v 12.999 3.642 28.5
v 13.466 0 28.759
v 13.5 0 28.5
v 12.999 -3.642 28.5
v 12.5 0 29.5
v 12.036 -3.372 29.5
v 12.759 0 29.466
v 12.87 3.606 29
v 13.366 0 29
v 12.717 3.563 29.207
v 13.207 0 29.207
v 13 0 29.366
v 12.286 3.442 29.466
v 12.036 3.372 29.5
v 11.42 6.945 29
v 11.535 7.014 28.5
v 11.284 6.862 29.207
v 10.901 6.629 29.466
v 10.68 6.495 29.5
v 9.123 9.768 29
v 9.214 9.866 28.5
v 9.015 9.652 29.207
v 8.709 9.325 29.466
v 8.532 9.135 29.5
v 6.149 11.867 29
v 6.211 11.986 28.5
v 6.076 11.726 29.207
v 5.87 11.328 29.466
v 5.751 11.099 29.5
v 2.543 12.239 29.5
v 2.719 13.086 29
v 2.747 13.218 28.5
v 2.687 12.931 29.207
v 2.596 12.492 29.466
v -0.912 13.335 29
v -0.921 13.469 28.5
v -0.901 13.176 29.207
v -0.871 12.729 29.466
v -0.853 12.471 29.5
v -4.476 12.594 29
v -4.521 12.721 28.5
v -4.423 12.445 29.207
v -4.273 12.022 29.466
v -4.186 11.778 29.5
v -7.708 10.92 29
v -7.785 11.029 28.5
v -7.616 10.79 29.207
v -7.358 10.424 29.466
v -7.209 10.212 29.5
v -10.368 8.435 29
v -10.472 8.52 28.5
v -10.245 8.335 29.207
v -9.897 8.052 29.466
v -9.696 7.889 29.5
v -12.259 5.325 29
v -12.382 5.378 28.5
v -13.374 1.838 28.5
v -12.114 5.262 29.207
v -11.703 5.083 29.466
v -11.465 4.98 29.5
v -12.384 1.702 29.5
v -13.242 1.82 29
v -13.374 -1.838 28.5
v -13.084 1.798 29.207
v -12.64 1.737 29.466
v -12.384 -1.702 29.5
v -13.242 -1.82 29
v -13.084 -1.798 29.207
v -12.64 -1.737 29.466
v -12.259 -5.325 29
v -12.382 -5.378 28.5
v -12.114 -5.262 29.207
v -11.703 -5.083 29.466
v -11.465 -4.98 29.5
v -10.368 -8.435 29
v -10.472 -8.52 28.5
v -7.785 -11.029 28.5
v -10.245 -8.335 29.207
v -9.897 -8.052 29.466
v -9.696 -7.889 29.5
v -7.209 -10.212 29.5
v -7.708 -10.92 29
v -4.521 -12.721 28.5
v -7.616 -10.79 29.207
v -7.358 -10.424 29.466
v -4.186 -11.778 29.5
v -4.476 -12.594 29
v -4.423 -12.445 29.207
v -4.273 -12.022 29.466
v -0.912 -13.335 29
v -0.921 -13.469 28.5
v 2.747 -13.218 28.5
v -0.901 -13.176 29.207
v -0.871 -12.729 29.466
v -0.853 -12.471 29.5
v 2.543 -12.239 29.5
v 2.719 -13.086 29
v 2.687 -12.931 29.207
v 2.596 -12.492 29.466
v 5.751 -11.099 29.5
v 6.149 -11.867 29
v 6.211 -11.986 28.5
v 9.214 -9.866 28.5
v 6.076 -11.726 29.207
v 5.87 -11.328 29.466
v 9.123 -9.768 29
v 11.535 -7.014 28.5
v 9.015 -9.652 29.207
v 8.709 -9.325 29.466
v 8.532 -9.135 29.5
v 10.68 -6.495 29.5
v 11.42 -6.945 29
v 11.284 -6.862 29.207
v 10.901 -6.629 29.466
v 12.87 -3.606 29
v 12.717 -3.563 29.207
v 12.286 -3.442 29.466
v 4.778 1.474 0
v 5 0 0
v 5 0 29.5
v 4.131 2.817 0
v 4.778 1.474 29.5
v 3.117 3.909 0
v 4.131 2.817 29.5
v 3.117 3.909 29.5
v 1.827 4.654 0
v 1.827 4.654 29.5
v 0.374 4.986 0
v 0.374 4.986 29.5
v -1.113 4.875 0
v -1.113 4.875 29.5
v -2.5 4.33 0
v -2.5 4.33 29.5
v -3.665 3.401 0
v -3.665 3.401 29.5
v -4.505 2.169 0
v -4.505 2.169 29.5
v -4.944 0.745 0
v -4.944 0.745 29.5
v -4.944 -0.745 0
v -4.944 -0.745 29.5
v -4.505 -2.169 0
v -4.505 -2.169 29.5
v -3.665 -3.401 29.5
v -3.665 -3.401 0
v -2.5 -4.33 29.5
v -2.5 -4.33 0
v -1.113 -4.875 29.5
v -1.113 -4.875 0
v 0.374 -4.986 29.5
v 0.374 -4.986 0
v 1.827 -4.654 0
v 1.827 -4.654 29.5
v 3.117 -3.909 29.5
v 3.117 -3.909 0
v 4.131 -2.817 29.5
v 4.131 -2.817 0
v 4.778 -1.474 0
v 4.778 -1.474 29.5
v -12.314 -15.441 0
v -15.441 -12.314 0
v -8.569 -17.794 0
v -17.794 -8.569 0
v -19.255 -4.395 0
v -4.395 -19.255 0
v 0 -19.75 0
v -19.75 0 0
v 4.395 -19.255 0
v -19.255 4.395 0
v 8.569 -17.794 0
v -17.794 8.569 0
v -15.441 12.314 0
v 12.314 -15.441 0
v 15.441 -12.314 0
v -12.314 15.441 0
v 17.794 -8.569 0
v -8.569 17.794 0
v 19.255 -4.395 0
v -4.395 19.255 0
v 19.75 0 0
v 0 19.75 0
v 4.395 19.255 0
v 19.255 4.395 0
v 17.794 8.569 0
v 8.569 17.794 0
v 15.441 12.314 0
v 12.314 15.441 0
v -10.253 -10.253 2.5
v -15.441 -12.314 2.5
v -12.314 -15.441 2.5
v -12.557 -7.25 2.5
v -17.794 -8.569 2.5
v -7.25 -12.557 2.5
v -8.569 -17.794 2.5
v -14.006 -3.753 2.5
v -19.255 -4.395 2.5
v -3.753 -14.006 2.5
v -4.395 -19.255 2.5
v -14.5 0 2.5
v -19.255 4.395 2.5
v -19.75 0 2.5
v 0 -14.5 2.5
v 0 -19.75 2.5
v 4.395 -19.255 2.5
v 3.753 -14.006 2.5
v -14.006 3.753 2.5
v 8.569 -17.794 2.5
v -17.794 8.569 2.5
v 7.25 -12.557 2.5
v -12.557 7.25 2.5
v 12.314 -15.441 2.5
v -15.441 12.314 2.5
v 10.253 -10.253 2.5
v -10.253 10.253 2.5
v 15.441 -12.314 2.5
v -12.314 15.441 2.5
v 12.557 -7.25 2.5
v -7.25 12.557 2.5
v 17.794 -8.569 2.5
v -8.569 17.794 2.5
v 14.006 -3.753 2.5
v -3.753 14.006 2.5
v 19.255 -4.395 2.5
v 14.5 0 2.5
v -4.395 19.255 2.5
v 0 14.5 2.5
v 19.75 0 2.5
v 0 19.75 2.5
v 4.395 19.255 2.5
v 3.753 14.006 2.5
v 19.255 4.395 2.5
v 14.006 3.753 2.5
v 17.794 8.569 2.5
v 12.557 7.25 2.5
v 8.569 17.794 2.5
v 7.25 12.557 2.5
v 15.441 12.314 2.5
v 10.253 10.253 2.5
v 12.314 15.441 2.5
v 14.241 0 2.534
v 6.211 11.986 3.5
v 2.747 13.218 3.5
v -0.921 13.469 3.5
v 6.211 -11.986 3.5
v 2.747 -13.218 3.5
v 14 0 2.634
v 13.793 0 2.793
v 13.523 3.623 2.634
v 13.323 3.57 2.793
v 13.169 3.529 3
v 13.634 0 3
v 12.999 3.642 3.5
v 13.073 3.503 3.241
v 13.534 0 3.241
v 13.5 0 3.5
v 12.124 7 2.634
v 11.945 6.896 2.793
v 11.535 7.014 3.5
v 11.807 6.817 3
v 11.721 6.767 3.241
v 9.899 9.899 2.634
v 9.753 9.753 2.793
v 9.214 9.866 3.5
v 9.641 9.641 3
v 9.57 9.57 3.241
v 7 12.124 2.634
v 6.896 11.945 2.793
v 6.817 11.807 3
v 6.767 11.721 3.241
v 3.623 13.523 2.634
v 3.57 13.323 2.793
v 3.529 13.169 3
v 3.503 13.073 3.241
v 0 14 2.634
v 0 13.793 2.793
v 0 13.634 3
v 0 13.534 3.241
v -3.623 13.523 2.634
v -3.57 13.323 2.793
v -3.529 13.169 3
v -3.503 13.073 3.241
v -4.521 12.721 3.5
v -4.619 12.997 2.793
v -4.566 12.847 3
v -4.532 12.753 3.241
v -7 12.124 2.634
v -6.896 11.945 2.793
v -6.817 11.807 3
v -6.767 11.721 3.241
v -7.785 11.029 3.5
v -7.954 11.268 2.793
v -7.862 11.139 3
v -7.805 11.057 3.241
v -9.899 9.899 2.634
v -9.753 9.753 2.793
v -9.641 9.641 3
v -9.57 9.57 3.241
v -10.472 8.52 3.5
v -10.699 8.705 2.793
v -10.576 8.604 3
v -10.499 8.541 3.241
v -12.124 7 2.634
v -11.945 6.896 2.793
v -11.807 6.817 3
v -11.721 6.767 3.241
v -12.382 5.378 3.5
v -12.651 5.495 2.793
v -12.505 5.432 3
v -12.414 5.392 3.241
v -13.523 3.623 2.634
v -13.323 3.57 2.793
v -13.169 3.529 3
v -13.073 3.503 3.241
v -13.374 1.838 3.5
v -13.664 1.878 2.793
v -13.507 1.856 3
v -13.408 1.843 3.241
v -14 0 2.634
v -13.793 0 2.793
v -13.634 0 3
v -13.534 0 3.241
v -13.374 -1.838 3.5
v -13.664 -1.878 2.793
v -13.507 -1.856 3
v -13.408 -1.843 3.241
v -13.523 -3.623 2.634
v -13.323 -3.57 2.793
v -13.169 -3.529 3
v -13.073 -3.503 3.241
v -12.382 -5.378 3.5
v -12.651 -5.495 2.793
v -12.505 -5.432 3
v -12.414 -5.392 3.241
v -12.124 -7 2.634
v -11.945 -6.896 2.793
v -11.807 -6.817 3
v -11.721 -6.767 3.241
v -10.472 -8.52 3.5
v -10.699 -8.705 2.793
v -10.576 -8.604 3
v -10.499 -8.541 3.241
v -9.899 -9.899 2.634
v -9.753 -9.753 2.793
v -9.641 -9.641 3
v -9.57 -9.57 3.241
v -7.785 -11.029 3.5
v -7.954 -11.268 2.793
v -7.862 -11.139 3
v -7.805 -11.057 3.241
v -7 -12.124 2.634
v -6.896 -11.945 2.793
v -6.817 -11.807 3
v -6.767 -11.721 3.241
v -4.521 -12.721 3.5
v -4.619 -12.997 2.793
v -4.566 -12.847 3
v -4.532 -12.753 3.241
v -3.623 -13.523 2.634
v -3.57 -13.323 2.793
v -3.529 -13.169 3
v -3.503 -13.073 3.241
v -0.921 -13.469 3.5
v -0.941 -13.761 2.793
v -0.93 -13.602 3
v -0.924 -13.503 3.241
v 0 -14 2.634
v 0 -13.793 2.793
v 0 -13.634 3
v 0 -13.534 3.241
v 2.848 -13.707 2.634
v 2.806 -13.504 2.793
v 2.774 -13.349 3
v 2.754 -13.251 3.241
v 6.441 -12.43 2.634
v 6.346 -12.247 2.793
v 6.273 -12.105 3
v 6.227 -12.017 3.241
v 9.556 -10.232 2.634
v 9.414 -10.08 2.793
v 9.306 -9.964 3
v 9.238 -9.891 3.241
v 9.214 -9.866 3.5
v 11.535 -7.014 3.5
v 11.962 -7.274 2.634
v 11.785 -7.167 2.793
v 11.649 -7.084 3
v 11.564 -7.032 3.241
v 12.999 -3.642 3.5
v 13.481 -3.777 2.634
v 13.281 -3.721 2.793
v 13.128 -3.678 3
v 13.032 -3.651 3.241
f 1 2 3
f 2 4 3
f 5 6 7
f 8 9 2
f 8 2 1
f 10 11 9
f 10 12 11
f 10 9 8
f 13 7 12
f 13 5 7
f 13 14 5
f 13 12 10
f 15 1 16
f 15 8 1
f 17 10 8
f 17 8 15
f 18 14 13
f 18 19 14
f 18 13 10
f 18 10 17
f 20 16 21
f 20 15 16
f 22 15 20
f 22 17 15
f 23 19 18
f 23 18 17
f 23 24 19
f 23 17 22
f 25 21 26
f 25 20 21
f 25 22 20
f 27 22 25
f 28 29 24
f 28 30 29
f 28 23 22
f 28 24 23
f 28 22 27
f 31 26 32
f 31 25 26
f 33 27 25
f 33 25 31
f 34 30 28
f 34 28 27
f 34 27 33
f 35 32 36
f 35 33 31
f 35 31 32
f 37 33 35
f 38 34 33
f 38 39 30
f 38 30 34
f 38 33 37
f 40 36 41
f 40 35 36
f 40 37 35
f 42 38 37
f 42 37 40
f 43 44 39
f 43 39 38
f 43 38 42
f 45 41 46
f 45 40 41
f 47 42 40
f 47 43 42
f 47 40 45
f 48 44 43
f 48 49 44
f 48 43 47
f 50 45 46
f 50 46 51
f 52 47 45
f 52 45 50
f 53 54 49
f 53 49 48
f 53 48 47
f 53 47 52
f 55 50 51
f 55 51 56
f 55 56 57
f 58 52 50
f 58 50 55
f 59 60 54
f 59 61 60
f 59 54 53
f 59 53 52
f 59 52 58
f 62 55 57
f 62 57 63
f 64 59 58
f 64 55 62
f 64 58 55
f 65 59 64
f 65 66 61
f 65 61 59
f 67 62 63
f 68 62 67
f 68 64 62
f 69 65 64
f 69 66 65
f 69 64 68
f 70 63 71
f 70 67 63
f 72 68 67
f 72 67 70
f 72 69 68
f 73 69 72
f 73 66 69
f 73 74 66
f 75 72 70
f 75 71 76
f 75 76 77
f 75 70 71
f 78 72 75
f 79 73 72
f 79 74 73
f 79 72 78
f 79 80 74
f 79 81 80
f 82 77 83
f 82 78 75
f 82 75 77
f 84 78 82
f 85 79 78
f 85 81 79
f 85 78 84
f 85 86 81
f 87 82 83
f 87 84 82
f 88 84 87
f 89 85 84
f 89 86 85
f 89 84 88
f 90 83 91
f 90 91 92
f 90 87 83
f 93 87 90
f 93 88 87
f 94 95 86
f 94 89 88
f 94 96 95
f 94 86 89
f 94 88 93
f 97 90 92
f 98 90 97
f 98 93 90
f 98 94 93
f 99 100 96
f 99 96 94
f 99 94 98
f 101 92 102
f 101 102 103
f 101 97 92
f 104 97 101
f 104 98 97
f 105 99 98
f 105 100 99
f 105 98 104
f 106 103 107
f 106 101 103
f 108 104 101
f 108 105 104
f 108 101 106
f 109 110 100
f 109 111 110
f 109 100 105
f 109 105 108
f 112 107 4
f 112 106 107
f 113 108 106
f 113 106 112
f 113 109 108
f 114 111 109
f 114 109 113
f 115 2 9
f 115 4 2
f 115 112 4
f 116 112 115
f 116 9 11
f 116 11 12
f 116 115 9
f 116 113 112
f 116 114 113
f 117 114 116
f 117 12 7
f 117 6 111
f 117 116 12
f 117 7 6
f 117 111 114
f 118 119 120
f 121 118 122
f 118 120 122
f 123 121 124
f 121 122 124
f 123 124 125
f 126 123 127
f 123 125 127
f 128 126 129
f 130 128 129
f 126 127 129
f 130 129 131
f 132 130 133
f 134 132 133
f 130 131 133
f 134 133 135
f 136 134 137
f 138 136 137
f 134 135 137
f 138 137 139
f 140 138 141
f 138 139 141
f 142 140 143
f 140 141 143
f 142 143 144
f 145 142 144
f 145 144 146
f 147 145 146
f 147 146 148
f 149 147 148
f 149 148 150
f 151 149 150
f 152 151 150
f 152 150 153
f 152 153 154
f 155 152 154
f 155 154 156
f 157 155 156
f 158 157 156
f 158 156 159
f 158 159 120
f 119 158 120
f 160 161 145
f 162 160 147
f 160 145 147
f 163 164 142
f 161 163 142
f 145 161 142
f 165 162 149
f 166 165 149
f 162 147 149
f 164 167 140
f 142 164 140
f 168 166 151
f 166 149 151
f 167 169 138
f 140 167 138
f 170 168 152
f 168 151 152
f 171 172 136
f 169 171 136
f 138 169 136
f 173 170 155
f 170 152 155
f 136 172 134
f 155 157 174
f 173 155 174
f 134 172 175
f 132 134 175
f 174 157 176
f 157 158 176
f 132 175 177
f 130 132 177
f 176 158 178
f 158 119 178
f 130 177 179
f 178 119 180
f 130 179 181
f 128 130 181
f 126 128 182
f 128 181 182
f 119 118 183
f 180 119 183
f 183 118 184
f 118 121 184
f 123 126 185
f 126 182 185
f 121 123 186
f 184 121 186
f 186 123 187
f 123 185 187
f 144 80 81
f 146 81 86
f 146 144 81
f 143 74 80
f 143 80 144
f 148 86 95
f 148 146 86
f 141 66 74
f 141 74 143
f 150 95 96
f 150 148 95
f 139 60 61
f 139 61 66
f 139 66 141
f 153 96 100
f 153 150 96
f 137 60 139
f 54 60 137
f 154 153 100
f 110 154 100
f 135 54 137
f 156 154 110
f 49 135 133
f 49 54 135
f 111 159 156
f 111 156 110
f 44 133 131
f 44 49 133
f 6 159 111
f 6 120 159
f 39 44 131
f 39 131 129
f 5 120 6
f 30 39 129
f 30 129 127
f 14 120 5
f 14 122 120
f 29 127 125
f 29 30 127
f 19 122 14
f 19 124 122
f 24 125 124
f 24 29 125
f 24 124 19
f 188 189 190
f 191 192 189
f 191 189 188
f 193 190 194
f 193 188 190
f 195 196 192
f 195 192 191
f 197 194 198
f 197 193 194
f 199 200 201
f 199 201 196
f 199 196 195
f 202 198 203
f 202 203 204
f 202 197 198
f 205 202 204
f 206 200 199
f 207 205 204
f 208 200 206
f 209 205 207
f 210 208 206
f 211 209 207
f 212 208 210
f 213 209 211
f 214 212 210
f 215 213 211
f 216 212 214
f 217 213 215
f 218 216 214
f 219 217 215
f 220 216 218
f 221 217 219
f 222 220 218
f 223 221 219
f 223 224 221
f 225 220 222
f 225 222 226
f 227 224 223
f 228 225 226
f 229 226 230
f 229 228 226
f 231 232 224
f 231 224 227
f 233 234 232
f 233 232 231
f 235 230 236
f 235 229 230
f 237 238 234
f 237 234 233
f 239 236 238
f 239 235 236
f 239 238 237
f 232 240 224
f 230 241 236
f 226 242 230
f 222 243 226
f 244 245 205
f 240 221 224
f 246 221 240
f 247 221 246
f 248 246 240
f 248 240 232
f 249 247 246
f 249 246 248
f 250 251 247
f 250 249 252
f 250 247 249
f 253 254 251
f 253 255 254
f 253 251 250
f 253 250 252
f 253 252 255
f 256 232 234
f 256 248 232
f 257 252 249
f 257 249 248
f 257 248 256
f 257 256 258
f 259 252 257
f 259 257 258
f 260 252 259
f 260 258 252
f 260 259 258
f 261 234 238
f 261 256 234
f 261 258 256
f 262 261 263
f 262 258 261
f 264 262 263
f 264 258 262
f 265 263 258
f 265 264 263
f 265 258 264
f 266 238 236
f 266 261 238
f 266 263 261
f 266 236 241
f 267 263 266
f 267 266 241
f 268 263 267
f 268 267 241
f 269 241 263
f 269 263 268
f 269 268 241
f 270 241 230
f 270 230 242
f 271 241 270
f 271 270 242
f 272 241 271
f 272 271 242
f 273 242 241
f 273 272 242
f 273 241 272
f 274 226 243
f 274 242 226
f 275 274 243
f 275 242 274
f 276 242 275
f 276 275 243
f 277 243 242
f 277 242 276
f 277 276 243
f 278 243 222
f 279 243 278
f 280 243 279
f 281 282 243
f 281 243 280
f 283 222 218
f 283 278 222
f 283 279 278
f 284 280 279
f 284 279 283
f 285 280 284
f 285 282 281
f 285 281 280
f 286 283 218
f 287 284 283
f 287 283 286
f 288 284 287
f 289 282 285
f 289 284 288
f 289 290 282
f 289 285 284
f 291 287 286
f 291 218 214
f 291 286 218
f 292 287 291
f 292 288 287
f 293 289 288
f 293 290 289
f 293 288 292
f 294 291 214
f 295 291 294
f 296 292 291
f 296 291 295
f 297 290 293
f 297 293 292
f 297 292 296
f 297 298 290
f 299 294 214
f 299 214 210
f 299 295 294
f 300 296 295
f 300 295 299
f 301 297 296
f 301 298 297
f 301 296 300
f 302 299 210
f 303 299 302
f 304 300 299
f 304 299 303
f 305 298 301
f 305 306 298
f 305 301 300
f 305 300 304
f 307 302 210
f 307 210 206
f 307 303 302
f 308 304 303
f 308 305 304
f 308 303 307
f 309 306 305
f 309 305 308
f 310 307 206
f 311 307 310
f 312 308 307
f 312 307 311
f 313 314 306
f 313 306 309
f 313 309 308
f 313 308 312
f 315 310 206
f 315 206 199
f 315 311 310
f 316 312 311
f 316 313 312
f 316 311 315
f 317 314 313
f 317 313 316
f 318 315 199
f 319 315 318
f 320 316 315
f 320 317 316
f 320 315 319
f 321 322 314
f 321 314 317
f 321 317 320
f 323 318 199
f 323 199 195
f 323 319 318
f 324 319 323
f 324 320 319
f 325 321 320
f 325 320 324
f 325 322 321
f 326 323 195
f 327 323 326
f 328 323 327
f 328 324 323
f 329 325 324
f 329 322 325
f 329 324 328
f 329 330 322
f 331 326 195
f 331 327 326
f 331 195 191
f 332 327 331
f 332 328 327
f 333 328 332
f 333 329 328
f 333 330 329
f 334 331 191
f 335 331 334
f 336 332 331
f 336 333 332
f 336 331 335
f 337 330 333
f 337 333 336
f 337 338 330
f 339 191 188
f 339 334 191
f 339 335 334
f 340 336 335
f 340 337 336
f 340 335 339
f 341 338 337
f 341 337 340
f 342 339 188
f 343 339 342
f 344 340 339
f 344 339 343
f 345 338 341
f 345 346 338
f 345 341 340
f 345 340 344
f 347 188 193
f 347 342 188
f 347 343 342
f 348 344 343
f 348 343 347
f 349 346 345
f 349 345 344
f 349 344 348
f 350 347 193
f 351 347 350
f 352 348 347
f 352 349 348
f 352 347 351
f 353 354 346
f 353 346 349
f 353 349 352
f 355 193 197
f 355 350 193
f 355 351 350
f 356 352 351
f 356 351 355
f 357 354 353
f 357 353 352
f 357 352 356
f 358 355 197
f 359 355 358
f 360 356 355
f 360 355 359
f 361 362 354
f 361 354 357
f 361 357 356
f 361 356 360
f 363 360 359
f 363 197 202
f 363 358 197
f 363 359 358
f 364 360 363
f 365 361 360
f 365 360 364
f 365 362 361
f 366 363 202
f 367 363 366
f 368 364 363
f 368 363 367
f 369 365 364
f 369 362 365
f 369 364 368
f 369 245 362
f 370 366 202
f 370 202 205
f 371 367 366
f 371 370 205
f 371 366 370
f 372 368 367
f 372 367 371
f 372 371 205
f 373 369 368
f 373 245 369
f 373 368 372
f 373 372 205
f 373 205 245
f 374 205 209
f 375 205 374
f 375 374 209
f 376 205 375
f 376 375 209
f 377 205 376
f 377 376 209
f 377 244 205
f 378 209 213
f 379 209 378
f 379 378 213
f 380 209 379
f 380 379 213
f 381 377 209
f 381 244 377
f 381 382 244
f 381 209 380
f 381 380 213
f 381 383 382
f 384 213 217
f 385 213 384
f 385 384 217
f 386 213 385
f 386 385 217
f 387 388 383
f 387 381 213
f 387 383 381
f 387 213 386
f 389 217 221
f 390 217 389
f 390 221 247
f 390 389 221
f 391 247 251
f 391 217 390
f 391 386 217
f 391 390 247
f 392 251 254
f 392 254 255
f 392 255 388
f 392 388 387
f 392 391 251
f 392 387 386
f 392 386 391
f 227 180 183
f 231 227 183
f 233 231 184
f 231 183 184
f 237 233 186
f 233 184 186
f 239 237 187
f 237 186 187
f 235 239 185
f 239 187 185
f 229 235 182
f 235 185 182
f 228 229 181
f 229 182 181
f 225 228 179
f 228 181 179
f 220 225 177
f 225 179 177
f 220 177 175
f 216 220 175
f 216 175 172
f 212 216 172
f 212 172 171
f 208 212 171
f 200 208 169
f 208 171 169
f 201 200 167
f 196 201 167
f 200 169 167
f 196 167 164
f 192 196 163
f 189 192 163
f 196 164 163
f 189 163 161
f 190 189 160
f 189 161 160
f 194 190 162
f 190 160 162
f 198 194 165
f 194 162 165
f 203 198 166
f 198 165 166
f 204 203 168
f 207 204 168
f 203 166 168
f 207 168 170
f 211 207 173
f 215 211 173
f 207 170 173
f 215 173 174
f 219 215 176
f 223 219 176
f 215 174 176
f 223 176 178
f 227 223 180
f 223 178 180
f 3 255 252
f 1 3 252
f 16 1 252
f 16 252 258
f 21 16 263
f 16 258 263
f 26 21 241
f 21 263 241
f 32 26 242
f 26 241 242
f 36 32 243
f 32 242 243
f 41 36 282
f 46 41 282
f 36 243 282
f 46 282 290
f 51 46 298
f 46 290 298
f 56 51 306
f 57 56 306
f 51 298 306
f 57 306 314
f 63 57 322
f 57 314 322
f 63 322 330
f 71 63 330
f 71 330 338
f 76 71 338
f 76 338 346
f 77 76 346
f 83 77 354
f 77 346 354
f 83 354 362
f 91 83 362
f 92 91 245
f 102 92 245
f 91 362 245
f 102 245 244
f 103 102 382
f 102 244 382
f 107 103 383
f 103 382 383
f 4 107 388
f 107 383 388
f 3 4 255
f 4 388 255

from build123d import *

# Parameters (mm, degrees)
SKETCH_R     = 19.75
PAD_DEPTH    = 2.5
SKETCH001_R  = 13.5
PAD001_DEPTH = 27
SKETCH002_R  = 5
POCKET_DEPTH = 29.501
FILLET_R     = 1


with BuildPart() as part:
    # Sketch → Pad (new body)
    with BuildSketch(Plane.XY):
        Circle(SKETCH_R)
    extrude(amount=PAD_DEPTH)

    # Sketch001 (on Face3 of Pad) → Pad001 (join)
    with BuildSketch(Plane.XY.offset(2.5)):
        Circle(SKETCH001_R)
    extrude(amount=PAD001_DEPTH)

    # Sketch002 (on Face5 of Pad001) → Pocket (cut, through all)
    with BuildSketch(Plane.XY.offset(29.5)):
        Circle(SKETCH002_R)
    extrude(amount=-POCKET_DEPTH, mode=Mode.SUBTRACT)

    # Fillet
    fillet_edges = [part.edges().sort_by_distance(p)[0] for p in [
        (-13.5, 0, 29.5),
        (-13.5, 0, 2.5),
    ]]
    fillet(fillet_edges, radius=FILLET_R)


solid = part.part
